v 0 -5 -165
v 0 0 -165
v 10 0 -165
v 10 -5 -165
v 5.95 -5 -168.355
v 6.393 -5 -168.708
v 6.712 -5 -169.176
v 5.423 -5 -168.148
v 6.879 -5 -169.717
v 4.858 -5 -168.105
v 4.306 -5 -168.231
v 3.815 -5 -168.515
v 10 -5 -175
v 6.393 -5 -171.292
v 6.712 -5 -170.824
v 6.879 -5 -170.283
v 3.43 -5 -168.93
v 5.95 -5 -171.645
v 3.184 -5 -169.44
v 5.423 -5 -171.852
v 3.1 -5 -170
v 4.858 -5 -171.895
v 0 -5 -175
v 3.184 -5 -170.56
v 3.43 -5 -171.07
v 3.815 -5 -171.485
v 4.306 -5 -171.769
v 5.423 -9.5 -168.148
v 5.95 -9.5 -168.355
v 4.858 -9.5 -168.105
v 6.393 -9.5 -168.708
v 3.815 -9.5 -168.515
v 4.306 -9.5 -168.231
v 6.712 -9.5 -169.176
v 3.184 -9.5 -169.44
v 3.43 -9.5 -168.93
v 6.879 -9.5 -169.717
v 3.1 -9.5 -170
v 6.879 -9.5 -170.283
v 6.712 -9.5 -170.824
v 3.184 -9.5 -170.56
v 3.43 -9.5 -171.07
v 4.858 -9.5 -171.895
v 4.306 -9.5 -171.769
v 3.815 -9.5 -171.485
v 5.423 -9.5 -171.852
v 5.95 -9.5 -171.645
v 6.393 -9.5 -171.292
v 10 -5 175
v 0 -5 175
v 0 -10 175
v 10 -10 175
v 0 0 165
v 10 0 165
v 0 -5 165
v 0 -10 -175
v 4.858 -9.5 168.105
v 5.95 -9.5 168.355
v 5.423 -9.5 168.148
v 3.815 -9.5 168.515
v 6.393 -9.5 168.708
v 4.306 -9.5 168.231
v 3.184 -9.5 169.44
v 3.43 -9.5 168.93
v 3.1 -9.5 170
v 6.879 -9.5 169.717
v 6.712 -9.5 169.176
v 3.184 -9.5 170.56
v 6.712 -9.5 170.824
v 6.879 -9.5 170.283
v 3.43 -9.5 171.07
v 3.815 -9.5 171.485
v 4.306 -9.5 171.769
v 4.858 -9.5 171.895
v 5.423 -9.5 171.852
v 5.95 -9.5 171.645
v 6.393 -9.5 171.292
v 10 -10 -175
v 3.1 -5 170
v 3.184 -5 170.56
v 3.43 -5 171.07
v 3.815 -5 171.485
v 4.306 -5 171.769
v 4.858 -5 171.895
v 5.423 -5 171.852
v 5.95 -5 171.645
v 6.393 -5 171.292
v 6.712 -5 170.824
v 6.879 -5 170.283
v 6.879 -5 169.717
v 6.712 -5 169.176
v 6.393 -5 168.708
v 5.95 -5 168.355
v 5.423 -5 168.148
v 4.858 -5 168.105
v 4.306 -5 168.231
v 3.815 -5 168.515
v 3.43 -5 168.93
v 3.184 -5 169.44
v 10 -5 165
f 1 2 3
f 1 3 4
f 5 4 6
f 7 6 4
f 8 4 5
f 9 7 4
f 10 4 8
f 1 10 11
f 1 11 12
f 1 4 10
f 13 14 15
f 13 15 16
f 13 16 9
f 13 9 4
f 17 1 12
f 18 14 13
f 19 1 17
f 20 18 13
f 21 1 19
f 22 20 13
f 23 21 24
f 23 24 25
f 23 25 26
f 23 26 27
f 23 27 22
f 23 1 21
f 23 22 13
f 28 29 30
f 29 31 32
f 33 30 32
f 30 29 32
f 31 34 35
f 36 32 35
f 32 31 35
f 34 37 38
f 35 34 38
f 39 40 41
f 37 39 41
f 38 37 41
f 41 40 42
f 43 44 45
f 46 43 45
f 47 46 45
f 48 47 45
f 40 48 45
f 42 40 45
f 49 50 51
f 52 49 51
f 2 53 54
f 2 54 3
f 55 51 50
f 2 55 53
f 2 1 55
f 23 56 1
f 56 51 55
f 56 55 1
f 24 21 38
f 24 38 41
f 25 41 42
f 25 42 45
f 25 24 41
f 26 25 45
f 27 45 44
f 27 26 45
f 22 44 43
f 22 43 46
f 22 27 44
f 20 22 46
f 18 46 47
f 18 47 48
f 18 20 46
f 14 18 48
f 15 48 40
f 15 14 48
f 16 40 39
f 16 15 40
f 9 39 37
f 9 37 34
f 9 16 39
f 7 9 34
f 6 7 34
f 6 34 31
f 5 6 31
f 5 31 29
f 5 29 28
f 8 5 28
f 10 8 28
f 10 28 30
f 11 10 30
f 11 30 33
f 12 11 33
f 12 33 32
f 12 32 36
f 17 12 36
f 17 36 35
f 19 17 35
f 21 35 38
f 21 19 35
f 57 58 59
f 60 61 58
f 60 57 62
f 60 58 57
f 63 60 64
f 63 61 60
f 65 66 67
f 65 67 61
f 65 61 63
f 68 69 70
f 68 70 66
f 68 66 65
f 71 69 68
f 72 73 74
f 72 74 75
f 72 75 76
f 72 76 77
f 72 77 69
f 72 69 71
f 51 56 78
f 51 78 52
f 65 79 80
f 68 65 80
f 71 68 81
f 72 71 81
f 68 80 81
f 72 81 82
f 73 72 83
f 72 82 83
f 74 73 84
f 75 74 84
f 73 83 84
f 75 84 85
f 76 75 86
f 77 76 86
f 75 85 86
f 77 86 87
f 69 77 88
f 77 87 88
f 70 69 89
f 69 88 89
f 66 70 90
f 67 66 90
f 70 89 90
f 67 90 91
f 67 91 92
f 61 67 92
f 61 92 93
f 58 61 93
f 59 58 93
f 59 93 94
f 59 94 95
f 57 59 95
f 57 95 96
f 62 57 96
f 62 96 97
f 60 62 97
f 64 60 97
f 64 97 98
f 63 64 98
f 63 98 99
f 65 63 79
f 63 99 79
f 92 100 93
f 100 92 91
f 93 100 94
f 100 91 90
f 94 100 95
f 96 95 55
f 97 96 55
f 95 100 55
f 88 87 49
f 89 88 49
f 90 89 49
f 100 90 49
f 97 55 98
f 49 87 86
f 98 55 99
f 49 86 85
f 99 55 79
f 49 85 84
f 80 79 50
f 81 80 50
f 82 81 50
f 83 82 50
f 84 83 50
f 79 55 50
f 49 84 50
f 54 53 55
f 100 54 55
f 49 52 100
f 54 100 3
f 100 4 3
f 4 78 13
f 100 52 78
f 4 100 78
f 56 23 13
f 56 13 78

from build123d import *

# Parameters (mm, degrees)
F1_DEPTH = 10
F2_R     = 1.9
F3_DEPTH = 4.5


with BuildPart() as f1:
    # F0 (on Right) → F1 (new body)
    with BuildSketch(Plane.YZ):
        Polygon((-10, 0), (0, 0), (0, 165), (-5, 165), (-5, 175), (-10, 175), align=None)
    extrude(amount=F1_DEPTH)

    # F2 (on face) → F3 (cut)
    with BuildSketch(Plane(origin=(0, -5, 0), x_dir=(-1, 0, 0), z_dir=(0, 1, 0))):
        with Locations((-5, 170)):
            Circle(F2_R)
    extrude(amount=-F3_DEPTH, mode=Mode.SUBTRACT)

    # F4: F1 across plane


with BuildPart() as f1_1:
    add(f1.part)
    add(f1.part.mirror(Plane.XY))


solid = f1_1.part
